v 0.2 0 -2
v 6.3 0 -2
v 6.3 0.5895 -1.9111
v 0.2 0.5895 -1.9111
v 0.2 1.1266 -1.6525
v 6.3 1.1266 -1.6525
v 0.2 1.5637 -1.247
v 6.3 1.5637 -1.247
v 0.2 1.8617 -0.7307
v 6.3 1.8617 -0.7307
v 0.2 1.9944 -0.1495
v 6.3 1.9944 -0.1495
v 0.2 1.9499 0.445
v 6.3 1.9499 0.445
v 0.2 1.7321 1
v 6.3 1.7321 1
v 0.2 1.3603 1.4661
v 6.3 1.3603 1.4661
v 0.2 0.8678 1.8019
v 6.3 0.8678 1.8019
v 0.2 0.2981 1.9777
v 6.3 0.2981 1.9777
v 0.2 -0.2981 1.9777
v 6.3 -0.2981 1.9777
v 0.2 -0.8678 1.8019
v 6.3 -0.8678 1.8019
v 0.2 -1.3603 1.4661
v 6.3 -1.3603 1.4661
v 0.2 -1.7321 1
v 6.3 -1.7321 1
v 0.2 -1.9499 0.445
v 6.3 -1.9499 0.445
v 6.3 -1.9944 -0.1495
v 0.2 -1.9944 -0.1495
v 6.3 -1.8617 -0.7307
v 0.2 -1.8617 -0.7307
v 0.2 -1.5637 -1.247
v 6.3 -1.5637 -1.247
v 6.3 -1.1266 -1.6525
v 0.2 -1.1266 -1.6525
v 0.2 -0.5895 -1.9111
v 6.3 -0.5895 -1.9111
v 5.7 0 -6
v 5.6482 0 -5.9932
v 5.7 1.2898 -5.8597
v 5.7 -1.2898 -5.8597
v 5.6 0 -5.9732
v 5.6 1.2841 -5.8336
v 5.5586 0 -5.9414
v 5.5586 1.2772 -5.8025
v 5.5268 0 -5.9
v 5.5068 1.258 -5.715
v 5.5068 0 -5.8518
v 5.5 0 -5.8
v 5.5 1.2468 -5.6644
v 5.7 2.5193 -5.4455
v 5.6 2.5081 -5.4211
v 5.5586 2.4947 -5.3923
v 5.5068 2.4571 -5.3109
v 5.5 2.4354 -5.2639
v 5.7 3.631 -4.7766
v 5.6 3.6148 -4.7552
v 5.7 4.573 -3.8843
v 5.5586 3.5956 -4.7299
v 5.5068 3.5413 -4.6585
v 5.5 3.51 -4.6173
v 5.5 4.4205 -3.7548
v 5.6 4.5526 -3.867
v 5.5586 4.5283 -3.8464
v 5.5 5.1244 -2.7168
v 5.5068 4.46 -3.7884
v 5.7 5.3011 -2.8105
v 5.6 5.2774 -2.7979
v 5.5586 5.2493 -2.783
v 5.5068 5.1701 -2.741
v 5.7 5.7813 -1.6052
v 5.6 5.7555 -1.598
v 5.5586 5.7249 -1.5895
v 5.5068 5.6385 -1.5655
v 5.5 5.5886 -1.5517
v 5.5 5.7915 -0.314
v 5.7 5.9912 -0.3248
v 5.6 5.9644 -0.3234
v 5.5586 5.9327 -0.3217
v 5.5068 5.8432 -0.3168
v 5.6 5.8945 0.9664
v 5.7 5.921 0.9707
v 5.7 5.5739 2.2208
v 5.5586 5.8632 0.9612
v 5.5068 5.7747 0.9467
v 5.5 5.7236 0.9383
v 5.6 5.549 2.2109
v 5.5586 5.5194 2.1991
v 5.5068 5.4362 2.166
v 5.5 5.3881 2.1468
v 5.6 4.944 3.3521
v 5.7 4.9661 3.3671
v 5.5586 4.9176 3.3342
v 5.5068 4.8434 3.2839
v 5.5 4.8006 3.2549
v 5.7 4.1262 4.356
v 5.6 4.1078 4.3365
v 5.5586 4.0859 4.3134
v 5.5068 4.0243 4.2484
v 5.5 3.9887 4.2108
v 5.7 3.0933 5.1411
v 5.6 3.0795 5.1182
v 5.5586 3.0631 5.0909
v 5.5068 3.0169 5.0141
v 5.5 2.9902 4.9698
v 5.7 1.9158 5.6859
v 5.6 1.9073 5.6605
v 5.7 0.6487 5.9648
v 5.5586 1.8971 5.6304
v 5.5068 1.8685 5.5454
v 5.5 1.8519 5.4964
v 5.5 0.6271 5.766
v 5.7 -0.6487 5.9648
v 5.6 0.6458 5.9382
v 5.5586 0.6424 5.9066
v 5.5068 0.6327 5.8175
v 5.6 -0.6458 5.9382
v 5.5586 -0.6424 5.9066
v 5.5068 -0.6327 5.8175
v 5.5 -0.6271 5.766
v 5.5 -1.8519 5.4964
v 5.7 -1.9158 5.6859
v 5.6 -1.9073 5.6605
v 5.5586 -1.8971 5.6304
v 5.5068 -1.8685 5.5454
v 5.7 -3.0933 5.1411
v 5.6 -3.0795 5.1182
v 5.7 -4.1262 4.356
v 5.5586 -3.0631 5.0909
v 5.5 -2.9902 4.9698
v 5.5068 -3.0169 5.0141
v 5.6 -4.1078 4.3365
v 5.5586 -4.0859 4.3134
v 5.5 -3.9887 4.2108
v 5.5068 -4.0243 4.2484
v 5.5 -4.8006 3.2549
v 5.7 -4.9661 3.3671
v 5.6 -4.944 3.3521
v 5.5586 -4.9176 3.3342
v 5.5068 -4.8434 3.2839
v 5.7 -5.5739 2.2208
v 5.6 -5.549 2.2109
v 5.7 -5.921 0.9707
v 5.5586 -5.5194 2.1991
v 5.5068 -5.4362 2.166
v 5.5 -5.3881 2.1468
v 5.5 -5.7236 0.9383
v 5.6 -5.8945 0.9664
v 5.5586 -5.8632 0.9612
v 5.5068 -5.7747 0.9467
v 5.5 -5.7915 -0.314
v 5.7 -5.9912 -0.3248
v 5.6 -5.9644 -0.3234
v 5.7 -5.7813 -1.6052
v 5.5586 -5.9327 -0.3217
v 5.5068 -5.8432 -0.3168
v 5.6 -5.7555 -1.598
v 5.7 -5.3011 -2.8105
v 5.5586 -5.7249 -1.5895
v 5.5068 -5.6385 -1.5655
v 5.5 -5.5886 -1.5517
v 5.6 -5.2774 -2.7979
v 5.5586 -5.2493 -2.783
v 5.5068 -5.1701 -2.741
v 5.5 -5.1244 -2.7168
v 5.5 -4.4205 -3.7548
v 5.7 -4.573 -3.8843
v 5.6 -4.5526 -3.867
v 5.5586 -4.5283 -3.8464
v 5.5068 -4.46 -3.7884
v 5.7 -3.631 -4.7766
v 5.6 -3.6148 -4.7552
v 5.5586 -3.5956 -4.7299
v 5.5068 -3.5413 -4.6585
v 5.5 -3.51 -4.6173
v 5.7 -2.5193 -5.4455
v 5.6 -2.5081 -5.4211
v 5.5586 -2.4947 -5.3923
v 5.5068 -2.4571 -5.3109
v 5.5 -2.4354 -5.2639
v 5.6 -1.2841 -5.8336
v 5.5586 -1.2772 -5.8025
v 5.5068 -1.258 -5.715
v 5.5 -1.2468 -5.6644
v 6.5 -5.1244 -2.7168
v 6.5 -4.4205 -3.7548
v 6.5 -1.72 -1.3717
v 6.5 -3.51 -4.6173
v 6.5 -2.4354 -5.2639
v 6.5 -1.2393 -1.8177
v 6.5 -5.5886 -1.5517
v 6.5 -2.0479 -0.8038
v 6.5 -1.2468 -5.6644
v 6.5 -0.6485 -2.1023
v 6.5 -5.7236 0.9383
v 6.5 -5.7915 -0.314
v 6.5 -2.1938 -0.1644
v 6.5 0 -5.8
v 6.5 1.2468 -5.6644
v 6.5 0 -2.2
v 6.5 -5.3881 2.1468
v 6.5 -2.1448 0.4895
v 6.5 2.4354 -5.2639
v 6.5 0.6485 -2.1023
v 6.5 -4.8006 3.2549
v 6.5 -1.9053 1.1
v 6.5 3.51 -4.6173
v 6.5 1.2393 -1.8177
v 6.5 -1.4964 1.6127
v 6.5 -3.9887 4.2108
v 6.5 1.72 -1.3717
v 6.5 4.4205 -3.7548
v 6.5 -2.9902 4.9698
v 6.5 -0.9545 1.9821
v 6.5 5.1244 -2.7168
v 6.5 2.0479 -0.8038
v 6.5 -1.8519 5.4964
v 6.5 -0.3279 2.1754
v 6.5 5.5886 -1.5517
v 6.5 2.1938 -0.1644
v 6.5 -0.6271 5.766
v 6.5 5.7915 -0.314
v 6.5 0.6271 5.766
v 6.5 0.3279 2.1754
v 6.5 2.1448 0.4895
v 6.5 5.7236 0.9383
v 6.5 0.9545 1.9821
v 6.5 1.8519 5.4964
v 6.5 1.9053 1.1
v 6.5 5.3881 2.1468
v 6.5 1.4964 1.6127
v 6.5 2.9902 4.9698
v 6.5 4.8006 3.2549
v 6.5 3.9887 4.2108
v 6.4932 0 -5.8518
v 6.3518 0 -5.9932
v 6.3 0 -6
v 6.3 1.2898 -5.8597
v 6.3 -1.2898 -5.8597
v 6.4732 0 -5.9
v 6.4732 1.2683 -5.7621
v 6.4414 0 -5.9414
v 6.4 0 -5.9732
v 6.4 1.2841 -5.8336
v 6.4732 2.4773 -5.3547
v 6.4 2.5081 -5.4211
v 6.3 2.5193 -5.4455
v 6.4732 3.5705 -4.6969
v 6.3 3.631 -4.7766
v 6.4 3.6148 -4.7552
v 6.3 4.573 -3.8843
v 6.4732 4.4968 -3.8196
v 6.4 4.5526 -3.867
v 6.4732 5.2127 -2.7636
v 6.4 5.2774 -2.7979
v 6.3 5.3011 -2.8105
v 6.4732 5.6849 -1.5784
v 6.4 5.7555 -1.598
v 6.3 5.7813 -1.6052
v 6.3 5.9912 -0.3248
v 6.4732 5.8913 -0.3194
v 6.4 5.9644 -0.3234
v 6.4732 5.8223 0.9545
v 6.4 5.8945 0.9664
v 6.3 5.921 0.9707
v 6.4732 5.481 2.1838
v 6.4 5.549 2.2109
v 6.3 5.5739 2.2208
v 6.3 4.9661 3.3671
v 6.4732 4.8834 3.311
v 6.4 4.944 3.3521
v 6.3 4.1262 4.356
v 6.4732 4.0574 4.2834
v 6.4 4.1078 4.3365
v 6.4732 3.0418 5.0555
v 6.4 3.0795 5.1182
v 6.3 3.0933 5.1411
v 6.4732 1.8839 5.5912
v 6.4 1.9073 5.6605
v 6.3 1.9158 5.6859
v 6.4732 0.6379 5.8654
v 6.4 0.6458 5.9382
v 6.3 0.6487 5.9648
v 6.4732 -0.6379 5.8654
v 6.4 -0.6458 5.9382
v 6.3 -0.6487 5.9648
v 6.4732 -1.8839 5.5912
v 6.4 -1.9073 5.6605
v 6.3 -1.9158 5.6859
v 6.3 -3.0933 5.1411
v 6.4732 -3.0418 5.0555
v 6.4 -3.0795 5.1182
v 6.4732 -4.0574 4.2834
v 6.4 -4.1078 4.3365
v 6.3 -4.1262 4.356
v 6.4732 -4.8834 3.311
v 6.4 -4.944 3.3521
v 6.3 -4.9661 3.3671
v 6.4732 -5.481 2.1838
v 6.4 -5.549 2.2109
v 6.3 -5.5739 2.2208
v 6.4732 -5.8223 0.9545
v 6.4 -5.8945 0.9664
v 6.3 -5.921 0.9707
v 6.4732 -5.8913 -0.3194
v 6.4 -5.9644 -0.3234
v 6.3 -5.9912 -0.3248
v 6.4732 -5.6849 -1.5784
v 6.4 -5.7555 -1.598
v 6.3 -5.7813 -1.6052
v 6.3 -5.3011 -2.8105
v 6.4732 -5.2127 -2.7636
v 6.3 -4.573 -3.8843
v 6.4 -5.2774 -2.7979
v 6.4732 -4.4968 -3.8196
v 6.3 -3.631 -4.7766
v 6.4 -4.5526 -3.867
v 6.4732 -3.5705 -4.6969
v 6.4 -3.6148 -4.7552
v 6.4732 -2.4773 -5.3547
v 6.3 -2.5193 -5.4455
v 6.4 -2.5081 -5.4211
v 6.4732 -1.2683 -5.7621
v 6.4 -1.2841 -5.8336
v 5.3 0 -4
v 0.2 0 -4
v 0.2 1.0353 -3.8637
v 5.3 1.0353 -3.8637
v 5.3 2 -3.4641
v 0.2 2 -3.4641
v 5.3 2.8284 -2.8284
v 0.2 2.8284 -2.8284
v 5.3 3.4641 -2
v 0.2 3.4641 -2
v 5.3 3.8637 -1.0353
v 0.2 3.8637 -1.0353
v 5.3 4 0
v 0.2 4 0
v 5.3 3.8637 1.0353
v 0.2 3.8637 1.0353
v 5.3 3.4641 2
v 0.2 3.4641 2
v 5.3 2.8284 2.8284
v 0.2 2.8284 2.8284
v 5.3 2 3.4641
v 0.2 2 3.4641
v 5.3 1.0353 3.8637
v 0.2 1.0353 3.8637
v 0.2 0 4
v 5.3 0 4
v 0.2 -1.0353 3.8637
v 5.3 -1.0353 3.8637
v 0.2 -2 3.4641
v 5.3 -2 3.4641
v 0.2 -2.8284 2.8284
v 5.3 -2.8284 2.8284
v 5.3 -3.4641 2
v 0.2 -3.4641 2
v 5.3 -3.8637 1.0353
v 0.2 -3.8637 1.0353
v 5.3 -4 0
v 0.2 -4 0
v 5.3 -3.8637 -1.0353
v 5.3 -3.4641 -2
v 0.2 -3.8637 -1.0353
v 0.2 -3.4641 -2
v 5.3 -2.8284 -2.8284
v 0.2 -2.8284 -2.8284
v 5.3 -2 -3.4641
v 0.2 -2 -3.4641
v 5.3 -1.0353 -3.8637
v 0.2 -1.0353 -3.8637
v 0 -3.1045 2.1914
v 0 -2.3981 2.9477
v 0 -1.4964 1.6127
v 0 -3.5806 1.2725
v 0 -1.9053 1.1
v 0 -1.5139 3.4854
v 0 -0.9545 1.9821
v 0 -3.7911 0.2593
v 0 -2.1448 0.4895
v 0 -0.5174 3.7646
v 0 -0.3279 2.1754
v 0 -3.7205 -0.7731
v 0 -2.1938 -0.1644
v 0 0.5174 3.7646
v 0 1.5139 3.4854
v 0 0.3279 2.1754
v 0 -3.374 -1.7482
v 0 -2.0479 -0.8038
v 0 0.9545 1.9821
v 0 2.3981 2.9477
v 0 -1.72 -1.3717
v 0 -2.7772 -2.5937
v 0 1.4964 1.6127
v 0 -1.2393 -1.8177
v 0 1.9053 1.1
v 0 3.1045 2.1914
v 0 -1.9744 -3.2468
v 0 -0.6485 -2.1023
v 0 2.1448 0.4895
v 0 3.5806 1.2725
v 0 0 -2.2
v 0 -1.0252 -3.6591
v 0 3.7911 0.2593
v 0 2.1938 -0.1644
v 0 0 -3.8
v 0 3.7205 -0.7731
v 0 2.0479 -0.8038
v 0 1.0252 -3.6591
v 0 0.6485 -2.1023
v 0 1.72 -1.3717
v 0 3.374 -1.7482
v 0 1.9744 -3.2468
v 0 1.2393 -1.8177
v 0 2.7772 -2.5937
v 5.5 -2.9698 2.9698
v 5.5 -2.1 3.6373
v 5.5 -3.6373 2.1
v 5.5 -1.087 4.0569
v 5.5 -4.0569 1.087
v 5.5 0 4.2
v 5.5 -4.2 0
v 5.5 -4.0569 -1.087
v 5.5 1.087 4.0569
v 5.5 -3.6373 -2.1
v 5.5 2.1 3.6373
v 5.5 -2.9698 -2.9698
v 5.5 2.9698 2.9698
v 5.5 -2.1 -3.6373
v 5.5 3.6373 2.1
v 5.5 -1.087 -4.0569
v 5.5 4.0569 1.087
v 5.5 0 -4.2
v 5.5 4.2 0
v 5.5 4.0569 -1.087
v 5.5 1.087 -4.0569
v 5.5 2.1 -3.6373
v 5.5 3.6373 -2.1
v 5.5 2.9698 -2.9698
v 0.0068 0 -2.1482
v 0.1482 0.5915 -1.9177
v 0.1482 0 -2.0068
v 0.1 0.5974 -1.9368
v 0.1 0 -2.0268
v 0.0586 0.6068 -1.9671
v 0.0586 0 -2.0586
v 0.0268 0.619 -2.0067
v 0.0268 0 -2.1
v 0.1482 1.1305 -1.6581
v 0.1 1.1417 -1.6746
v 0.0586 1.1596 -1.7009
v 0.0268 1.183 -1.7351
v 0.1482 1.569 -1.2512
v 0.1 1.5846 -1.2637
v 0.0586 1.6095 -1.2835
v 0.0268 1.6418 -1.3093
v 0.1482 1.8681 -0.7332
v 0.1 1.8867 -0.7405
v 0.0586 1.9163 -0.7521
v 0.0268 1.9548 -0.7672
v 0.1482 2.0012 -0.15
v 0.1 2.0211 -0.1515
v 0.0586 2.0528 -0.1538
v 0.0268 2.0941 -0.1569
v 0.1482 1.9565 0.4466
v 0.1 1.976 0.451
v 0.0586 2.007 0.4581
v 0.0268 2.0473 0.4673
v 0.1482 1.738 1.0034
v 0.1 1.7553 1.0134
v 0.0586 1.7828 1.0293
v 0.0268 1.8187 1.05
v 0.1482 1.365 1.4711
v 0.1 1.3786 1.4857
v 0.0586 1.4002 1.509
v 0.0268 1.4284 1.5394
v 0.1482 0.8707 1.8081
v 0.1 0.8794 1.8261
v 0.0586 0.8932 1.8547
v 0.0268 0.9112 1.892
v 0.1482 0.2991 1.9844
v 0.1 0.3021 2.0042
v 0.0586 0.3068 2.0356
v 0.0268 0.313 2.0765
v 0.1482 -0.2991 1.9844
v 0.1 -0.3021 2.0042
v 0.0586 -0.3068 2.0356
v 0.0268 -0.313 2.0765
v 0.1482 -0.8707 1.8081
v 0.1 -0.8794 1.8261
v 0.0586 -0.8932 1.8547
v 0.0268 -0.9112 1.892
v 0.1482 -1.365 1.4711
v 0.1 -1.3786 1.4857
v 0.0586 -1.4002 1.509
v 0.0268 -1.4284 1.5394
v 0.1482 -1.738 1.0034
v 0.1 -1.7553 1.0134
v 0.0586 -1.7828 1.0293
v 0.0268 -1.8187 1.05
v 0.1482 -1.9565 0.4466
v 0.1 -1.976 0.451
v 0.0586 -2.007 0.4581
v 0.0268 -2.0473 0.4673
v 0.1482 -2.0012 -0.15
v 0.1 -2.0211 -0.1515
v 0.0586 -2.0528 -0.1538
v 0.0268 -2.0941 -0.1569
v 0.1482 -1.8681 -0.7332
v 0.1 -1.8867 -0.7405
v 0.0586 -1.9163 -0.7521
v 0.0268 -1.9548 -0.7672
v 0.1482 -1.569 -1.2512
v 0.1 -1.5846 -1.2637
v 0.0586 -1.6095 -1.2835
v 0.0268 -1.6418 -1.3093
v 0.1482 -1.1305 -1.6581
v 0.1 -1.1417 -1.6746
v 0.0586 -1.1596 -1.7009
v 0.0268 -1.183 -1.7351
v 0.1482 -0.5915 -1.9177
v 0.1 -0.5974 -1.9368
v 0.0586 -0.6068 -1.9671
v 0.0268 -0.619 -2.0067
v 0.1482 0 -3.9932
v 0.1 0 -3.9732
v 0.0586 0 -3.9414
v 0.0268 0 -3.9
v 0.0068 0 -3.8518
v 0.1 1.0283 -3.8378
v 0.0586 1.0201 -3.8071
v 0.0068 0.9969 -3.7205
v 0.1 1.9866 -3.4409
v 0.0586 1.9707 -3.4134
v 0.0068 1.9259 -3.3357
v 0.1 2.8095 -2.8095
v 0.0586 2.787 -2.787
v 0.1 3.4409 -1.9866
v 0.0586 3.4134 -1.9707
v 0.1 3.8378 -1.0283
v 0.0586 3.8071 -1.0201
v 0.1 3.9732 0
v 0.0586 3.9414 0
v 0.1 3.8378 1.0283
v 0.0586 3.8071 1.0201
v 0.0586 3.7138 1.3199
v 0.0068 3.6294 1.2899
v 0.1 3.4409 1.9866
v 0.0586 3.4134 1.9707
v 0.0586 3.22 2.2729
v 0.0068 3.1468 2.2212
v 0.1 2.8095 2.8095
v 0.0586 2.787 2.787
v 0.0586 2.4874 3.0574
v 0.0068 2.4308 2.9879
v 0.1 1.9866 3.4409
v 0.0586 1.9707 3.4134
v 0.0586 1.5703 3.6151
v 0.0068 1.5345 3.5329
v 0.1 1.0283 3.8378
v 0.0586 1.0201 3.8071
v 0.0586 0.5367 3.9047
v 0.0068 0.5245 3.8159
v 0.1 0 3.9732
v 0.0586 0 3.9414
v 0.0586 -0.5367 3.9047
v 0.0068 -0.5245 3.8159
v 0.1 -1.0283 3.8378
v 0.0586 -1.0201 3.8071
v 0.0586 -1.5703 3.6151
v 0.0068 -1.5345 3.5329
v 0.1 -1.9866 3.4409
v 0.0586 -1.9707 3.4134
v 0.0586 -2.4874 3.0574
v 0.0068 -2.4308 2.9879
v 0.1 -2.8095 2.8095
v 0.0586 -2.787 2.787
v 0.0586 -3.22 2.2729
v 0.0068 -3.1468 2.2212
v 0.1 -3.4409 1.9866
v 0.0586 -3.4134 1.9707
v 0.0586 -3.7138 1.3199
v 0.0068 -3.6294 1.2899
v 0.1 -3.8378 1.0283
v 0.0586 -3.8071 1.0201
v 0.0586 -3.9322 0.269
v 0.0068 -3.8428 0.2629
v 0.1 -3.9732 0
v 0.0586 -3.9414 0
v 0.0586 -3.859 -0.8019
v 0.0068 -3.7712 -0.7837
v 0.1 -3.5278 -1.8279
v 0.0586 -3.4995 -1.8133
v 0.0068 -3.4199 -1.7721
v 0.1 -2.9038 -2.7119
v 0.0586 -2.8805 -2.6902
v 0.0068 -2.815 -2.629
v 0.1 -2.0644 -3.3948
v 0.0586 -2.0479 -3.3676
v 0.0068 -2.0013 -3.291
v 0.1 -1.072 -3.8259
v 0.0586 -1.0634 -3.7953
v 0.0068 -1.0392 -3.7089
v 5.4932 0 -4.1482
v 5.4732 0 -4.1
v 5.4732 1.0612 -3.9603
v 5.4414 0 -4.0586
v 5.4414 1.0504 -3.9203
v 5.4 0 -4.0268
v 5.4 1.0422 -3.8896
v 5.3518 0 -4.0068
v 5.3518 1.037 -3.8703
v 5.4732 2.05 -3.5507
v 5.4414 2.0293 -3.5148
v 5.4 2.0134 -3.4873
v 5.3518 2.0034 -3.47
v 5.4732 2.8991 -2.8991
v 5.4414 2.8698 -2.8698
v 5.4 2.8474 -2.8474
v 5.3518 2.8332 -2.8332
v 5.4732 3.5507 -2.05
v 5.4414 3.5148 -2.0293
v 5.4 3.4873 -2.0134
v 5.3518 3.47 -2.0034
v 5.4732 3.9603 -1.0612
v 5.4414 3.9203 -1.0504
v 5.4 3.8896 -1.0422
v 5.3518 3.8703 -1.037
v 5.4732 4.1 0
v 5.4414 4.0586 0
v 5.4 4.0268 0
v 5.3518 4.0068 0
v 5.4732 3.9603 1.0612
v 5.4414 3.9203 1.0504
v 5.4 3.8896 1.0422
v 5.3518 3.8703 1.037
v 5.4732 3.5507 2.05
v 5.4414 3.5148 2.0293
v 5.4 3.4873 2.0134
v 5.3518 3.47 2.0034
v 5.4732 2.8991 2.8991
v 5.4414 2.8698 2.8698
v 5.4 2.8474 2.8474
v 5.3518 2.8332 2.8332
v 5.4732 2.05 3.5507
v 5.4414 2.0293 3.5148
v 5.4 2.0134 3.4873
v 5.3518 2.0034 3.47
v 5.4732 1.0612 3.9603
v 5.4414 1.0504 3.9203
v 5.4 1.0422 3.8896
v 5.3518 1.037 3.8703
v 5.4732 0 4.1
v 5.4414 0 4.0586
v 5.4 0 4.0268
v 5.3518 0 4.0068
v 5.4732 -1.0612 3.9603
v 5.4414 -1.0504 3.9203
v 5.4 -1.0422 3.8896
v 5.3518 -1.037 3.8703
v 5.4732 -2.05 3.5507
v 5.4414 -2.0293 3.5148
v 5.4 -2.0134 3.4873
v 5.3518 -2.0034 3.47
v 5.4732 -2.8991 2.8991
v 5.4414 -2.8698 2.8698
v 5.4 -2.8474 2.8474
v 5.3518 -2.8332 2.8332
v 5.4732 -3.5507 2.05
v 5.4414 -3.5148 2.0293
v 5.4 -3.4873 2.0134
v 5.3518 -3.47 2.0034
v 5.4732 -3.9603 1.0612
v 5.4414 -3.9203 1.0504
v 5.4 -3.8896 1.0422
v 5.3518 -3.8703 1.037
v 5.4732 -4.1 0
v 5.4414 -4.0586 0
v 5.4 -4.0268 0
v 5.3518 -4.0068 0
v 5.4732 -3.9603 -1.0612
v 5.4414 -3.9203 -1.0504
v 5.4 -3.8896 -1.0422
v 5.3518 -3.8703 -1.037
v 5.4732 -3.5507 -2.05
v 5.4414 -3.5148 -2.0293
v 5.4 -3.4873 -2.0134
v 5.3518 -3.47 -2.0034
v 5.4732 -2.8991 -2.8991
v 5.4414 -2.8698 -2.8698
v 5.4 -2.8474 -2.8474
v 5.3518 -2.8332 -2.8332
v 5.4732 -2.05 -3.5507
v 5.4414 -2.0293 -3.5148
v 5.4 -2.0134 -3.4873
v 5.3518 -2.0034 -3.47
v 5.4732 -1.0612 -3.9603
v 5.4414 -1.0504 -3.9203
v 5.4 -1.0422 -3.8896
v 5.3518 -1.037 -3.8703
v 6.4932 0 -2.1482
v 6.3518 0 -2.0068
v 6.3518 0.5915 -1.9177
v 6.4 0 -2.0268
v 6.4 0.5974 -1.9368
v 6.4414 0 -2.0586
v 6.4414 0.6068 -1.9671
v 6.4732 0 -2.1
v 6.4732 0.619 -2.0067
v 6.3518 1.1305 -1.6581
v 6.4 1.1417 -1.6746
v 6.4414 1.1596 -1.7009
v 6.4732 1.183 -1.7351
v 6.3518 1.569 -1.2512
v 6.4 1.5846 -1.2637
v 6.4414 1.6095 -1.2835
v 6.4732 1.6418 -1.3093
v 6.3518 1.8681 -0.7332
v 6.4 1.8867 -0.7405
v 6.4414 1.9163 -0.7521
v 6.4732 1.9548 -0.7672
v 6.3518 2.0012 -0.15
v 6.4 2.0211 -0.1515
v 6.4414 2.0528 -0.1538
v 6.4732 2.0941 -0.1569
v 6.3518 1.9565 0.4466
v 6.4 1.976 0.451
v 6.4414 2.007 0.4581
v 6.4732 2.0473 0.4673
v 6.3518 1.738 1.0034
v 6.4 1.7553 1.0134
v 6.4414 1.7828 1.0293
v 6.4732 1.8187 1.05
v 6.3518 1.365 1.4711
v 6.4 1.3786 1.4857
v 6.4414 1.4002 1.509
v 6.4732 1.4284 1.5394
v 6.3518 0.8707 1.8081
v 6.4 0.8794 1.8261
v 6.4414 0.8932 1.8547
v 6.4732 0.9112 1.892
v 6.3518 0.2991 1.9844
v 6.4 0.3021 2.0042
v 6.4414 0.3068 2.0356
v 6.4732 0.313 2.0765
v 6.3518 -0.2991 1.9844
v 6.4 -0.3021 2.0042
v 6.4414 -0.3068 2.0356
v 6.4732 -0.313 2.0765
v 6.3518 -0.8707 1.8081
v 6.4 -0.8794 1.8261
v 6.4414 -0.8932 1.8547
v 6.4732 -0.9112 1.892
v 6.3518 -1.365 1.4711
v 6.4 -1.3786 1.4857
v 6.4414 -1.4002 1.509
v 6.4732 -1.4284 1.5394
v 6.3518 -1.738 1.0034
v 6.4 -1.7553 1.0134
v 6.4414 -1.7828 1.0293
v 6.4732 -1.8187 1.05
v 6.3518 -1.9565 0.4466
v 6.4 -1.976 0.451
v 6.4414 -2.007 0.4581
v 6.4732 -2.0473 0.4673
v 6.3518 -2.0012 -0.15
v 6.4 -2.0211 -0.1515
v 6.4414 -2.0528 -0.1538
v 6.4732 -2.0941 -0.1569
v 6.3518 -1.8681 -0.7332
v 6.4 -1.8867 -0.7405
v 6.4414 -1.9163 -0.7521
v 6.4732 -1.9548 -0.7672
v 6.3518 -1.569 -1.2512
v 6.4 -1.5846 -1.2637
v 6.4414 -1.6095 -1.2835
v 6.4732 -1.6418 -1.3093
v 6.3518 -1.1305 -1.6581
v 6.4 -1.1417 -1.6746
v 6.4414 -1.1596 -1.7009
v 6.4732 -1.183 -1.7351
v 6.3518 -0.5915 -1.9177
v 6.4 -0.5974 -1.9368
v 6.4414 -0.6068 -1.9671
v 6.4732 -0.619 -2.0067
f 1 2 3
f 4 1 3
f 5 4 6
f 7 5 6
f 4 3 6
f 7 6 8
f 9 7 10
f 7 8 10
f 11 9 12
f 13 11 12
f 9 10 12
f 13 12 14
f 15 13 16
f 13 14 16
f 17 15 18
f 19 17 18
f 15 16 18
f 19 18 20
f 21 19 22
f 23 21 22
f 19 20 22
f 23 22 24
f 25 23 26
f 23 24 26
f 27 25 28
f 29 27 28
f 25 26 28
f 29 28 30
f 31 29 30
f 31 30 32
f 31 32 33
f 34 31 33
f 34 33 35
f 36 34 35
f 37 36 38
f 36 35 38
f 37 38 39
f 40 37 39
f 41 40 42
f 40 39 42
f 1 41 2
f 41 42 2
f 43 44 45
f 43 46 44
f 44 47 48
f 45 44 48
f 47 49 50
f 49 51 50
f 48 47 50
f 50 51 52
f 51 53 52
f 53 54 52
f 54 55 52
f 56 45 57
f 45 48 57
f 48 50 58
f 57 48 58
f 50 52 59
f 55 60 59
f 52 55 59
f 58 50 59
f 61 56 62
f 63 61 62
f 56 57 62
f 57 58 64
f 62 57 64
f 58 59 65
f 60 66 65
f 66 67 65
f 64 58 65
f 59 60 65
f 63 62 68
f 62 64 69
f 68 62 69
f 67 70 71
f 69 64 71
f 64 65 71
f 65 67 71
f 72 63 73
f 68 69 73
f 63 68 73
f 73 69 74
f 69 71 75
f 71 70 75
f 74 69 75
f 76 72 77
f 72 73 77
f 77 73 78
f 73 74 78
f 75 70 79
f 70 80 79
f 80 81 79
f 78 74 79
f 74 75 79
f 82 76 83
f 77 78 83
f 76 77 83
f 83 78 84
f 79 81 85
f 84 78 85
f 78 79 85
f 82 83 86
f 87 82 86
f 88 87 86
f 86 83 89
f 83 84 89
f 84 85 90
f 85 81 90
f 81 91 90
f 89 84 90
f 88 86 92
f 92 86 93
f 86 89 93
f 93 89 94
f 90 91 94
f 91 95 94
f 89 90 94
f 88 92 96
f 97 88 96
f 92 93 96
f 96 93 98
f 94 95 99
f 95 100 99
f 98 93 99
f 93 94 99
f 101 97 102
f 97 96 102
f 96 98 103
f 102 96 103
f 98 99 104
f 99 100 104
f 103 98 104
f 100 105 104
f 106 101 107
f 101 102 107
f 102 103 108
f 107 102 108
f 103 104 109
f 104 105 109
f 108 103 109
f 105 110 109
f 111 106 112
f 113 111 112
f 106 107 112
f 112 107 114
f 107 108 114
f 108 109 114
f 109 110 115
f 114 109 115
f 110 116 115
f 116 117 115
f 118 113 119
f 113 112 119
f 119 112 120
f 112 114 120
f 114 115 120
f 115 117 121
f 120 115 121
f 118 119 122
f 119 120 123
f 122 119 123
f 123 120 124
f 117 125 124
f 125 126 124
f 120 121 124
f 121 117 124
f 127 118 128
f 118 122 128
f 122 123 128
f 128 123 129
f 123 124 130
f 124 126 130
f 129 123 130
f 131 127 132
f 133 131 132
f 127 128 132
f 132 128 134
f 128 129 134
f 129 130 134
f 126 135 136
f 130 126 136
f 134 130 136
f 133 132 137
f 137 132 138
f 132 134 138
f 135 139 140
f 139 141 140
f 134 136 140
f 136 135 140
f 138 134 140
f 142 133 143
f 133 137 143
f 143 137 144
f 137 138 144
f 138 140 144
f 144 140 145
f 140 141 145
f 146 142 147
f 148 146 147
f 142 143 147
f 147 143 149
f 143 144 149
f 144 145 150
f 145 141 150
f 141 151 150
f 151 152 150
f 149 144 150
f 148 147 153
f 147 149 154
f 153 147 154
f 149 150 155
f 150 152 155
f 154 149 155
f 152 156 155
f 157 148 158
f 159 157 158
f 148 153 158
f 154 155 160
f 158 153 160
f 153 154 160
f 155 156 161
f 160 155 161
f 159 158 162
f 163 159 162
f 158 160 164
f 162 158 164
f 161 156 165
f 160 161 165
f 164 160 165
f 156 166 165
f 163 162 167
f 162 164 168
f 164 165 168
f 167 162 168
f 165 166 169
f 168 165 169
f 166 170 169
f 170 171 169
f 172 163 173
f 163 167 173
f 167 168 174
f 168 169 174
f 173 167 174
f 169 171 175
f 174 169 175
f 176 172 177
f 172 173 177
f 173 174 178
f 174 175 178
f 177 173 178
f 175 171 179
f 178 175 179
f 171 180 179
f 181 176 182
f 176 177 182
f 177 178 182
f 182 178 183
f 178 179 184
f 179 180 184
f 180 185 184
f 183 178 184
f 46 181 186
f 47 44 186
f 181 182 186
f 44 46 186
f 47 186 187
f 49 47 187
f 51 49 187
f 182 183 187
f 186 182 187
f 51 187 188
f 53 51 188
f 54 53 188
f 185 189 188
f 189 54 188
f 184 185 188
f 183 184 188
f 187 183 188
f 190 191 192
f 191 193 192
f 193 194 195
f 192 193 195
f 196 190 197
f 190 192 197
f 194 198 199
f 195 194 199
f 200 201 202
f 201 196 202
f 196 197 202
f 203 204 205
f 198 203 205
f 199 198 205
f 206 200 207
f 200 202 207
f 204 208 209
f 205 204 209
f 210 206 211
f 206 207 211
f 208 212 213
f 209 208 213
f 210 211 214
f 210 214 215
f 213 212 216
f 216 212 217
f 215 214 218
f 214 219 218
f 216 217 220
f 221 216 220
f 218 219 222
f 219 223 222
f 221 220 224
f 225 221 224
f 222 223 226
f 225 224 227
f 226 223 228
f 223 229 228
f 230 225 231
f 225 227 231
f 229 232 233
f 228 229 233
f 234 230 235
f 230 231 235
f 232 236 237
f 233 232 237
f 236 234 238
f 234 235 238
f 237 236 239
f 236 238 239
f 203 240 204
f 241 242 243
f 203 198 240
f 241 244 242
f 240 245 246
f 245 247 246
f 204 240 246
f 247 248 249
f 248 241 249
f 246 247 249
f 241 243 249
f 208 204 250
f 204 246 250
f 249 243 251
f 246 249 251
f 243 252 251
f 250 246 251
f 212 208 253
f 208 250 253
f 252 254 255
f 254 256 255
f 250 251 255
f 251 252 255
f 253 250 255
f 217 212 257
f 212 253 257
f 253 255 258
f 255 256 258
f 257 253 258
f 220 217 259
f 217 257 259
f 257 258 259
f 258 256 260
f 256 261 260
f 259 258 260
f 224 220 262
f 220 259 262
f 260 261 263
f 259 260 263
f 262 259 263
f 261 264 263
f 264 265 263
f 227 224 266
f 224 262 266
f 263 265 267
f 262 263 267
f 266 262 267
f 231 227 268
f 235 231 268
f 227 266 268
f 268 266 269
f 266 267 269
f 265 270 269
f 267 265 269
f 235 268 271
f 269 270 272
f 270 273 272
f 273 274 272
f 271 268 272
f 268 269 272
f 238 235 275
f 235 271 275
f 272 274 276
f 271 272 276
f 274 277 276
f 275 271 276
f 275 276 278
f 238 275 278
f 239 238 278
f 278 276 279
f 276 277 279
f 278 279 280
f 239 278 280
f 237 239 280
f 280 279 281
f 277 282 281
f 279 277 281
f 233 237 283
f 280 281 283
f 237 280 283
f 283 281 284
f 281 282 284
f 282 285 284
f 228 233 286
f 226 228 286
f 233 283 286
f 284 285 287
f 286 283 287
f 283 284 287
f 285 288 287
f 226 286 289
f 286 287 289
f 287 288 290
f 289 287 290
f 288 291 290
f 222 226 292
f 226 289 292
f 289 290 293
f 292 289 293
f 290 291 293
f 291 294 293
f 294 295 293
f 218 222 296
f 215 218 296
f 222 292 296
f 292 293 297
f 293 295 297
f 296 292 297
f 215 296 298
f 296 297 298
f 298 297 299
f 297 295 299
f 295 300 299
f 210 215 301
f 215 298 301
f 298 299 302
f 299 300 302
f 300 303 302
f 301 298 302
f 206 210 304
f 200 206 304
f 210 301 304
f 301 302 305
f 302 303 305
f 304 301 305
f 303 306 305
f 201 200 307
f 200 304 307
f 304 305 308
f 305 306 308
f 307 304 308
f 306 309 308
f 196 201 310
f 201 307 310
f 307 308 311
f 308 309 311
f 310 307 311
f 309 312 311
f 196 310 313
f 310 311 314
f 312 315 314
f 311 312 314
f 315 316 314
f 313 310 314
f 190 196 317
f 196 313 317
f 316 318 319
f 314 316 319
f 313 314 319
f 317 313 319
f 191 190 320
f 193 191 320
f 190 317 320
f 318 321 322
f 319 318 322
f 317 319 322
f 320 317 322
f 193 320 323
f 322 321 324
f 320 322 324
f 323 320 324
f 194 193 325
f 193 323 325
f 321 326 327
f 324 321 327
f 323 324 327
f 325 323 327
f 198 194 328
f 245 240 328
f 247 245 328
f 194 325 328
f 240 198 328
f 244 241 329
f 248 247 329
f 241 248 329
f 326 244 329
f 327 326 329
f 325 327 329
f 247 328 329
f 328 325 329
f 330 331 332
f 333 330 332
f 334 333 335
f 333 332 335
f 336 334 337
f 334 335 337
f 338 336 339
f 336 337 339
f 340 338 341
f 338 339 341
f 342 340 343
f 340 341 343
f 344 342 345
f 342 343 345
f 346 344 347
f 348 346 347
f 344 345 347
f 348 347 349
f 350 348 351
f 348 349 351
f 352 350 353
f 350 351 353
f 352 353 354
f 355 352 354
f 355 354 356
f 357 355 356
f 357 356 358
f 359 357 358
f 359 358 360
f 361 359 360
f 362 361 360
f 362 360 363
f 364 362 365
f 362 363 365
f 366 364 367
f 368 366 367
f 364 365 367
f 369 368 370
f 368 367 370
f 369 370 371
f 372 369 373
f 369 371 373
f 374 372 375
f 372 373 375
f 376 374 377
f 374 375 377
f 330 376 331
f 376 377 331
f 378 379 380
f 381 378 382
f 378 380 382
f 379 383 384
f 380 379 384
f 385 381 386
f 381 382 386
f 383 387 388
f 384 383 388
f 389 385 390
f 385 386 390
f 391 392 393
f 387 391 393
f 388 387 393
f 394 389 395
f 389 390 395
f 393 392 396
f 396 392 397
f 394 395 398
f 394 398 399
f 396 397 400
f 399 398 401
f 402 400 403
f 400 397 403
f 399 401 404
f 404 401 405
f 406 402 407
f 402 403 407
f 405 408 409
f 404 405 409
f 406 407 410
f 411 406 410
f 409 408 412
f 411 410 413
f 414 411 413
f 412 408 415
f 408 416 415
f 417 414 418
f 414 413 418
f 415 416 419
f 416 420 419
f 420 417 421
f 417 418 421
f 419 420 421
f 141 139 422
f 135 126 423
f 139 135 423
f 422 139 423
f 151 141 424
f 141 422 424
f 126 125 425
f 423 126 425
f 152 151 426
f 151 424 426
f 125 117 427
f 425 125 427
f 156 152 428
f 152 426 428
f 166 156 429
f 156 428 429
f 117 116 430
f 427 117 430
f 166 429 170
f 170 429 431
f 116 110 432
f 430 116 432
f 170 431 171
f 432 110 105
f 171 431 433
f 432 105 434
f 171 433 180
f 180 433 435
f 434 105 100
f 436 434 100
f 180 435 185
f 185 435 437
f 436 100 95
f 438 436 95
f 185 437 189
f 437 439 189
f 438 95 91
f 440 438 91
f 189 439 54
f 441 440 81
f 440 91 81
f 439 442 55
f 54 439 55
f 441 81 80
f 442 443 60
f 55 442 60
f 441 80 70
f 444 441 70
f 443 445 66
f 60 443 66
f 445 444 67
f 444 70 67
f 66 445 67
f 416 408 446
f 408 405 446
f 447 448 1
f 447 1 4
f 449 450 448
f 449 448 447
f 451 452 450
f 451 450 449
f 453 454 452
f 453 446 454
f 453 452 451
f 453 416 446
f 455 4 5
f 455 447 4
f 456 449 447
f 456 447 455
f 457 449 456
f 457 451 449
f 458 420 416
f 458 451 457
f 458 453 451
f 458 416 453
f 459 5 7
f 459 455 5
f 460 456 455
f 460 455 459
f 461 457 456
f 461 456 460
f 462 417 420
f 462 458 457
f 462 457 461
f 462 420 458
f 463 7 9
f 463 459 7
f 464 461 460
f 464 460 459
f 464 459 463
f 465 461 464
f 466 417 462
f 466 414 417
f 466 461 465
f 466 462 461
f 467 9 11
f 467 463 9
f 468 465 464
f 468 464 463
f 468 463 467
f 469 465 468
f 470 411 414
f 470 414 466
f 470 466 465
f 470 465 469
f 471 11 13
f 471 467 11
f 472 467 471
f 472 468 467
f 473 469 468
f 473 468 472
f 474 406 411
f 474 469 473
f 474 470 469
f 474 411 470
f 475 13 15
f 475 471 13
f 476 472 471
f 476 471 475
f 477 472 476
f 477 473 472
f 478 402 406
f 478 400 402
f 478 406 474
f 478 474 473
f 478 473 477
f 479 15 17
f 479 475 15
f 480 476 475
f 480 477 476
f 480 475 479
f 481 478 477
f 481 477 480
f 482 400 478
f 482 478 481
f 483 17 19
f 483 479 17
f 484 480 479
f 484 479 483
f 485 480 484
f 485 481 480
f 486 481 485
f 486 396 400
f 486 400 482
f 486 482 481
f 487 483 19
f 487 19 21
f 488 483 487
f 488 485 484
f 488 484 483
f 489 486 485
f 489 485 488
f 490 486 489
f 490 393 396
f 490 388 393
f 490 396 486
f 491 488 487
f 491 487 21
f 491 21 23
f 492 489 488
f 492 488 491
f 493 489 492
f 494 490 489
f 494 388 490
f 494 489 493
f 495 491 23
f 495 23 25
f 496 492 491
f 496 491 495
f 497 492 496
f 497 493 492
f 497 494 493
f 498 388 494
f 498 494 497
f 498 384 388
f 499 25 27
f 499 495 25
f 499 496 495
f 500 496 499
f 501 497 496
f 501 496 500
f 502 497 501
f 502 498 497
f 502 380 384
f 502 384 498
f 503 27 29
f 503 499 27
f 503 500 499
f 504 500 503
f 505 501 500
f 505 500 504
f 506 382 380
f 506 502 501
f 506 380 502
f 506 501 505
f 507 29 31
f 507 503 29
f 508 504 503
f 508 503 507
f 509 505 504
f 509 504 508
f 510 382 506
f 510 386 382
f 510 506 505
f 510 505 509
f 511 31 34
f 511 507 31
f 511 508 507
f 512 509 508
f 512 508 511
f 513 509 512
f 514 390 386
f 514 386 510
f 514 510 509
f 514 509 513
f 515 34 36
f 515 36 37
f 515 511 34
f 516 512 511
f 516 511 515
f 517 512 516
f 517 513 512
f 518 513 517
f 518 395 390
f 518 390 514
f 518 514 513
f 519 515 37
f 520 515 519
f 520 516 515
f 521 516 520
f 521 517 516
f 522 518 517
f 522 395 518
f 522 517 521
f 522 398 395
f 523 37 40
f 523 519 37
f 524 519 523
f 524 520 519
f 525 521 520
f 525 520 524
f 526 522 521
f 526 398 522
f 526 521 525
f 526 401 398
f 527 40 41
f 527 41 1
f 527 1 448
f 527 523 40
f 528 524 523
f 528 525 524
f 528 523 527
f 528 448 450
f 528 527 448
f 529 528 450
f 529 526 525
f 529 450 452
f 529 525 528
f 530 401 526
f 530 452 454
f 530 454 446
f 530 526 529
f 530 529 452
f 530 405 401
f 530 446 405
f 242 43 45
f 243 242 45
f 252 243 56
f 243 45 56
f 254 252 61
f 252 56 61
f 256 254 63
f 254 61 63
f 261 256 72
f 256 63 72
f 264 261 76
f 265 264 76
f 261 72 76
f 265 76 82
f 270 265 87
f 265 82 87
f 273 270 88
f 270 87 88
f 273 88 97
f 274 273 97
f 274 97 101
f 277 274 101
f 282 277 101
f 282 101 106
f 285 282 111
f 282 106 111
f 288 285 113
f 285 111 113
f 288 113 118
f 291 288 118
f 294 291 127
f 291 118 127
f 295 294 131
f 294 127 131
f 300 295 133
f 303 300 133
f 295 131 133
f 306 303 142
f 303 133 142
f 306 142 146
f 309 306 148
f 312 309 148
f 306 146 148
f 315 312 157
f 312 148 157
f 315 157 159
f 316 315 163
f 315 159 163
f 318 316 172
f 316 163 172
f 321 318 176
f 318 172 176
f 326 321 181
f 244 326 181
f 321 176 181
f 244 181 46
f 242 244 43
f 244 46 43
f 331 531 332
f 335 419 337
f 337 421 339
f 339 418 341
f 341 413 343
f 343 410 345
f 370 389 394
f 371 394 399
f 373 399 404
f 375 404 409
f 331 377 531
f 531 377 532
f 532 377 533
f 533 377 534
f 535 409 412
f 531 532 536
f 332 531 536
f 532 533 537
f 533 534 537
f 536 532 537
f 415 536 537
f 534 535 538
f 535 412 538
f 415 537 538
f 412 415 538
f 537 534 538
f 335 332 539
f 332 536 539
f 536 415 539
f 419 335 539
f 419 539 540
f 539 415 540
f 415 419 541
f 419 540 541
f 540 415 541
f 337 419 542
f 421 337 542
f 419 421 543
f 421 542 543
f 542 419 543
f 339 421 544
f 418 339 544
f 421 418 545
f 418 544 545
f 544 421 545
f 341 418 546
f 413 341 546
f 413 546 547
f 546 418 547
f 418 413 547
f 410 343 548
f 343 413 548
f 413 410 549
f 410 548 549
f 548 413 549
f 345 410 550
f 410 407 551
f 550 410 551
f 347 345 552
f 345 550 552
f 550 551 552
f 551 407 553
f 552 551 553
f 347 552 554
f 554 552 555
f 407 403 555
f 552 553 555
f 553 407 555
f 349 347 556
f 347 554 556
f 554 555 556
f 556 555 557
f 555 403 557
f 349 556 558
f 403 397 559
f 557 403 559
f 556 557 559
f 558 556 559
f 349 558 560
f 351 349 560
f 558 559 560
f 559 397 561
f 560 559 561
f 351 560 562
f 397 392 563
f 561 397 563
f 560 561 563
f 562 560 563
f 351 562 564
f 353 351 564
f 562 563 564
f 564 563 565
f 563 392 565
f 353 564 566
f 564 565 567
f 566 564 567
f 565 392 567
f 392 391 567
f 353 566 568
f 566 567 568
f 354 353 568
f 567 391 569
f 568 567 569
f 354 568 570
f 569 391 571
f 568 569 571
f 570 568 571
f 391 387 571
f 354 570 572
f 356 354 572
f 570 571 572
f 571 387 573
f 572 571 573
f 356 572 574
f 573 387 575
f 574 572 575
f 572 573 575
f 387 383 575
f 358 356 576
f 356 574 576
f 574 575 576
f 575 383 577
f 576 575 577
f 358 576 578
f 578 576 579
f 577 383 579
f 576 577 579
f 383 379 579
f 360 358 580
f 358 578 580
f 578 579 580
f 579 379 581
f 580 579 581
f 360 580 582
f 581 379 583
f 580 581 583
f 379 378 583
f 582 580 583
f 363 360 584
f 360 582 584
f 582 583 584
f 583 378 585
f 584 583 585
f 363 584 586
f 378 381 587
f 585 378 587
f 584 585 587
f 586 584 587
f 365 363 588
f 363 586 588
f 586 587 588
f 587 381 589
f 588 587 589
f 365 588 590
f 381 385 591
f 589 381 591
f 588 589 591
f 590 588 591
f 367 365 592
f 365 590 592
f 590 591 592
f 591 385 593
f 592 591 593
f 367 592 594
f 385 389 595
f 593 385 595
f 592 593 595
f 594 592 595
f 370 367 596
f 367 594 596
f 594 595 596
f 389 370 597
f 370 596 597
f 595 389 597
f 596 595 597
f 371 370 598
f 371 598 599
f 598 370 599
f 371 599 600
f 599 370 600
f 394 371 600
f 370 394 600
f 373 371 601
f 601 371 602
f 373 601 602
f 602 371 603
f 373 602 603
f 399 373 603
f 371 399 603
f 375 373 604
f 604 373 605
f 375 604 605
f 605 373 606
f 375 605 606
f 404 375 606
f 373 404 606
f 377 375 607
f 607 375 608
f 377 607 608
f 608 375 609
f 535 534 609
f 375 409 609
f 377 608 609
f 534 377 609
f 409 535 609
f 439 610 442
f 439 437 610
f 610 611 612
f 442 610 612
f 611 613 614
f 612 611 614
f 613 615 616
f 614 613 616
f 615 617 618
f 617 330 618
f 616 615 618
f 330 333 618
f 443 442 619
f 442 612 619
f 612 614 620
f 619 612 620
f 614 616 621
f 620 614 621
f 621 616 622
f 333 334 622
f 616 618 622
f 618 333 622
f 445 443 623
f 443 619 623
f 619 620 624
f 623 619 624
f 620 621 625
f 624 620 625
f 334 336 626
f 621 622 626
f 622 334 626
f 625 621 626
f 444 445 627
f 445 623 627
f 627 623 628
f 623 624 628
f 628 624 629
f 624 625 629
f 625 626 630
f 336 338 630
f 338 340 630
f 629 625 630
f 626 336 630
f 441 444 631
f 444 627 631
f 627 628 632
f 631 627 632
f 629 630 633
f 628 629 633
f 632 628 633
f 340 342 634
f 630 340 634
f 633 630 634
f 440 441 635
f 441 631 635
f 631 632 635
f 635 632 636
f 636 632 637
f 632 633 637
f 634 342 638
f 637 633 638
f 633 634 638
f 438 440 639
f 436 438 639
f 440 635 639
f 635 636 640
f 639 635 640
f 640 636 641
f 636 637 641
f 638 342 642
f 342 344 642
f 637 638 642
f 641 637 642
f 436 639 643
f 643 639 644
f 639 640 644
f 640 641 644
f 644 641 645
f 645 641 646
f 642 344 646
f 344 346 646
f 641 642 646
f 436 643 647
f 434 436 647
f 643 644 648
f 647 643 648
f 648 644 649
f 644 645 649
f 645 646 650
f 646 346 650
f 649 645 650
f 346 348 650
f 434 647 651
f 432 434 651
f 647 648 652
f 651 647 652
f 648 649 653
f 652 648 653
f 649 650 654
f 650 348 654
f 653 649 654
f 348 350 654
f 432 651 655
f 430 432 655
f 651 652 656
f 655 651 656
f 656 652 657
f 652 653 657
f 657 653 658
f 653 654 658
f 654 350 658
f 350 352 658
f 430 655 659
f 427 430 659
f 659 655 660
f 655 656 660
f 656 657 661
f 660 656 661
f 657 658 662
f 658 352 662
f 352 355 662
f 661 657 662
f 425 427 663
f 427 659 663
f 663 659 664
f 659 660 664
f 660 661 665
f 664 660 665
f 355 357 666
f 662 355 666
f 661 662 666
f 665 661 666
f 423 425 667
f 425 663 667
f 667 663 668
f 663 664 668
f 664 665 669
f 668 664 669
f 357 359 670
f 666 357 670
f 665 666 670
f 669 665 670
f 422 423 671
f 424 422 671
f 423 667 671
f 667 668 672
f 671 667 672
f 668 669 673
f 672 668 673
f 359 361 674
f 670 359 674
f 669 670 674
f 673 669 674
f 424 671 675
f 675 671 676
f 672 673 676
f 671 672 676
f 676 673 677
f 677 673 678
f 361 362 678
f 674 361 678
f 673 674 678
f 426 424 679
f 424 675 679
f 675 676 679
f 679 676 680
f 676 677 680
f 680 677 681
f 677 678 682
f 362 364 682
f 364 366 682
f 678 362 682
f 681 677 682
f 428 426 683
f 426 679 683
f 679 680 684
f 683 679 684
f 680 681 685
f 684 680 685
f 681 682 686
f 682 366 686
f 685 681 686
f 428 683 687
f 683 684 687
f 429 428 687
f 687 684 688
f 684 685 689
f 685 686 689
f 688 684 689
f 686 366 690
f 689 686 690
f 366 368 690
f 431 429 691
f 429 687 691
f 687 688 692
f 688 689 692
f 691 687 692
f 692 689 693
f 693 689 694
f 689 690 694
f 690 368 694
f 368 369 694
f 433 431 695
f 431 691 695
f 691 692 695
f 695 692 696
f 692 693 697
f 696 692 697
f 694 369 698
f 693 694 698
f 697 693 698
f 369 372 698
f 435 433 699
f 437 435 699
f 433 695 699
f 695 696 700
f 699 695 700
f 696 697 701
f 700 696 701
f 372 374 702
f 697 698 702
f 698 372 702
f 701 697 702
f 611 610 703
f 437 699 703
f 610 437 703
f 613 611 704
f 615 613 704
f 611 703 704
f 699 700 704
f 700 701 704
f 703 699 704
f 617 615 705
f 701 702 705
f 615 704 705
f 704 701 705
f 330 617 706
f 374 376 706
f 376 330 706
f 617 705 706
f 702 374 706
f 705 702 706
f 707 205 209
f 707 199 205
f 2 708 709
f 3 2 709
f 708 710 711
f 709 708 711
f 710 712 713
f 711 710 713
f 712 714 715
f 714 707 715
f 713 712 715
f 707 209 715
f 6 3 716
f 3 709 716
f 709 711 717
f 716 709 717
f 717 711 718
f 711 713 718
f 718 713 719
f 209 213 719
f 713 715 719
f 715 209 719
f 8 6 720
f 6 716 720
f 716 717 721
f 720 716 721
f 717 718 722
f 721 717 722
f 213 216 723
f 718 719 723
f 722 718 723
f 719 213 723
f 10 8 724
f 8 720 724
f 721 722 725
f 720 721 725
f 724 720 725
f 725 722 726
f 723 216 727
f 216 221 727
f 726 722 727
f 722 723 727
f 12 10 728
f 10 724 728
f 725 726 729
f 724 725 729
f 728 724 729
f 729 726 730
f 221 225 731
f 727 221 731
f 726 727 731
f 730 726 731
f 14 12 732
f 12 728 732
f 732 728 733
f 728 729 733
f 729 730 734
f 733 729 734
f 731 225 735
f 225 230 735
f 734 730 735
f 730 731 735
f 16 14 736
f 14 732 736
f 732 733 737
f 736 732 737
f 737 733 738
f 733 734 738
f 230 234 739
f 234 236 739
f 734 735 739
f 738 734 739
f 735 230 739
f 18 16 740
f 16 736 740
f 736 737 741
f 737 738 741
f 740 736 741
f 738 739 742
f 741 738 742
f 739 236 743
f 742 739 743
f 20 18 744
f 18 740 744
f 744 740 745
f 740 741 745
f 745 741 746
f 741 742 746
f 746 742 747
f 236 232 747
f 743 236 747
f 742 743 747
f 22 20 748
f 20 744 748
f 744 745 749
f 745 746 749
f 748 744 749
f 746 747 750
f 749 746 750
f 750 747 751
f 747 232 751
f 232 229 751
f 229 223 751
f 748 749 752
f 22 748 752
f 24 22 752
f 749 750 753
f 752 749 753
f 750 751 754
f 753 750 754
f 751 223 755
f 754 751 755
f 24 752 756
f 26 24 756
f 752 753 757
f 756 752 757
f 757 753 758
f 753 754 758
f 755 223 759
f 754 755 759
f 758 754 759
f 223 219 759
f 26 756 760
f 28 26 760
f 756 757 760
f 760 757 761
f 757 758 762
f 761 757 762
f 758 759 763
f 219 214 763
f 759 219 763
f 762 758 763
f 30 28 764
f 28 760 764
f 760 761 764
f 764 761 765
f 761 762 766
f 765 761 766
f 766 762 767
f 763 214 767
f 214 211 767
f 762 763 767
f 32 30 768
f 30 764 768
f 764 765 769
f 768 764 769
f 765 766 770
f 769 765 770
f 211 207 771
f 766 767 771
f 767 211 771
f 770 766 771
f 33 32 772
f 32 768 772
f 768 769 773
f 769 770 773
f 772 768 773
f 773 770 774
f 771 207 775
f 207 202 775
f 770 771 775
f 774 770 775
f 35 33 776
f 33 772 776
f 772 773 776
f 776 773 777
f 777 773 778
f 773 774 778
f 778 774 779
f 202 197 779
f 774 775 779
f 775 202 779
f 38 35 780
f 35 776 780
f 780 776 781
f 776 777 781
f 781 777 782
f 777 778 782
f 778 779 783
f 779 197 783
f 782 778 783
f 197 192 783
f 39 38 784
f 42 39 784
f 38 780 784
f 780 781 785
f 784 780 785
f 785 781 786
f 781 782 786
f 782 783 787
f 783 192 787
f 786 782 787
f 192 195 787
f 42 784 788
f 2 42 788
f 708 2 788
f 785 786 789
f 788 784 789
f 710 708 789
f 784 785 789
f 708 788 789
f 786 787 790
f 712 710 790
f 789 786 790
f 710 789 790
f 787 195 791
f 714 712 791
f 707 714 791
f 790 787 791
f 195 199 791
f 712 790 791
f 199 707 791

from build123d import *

# Parameters (mm, degrees)
CONG_1_R = 0.2


with BuildPart() as part:
    # Esquisse1 → Révolution1 (revolve)
    with BuildSketch(Plane.XY, mode=Mode.PRIVATE) as r_volution1_sk:
        Polygon((0, 2), (6.5, 2), (6.5, 6), (5.5, 6), (5.5, 4), (0, 4), align=None)
    revolve(r_volution1_sk.sketch.rotate(Axis((0, 0, 0), (1, 0, 0)), 270), axis=Axis((0, 0, 0), (1, 0, 0)))

    # Congé1
    cong_1_edges = [part.edges().sort_by_distance(p)[0] for p in [
        (0, 0, 2),
        (6.5, 0, 2),
        (6.5, 0, 6),
        (5.5, 0, 6),
        (5.5, 0, 4),
        (0, 0, 4),
    ]]
    fillet(cong_1_edges, radius=CONG_1_R)


solid = part.part
